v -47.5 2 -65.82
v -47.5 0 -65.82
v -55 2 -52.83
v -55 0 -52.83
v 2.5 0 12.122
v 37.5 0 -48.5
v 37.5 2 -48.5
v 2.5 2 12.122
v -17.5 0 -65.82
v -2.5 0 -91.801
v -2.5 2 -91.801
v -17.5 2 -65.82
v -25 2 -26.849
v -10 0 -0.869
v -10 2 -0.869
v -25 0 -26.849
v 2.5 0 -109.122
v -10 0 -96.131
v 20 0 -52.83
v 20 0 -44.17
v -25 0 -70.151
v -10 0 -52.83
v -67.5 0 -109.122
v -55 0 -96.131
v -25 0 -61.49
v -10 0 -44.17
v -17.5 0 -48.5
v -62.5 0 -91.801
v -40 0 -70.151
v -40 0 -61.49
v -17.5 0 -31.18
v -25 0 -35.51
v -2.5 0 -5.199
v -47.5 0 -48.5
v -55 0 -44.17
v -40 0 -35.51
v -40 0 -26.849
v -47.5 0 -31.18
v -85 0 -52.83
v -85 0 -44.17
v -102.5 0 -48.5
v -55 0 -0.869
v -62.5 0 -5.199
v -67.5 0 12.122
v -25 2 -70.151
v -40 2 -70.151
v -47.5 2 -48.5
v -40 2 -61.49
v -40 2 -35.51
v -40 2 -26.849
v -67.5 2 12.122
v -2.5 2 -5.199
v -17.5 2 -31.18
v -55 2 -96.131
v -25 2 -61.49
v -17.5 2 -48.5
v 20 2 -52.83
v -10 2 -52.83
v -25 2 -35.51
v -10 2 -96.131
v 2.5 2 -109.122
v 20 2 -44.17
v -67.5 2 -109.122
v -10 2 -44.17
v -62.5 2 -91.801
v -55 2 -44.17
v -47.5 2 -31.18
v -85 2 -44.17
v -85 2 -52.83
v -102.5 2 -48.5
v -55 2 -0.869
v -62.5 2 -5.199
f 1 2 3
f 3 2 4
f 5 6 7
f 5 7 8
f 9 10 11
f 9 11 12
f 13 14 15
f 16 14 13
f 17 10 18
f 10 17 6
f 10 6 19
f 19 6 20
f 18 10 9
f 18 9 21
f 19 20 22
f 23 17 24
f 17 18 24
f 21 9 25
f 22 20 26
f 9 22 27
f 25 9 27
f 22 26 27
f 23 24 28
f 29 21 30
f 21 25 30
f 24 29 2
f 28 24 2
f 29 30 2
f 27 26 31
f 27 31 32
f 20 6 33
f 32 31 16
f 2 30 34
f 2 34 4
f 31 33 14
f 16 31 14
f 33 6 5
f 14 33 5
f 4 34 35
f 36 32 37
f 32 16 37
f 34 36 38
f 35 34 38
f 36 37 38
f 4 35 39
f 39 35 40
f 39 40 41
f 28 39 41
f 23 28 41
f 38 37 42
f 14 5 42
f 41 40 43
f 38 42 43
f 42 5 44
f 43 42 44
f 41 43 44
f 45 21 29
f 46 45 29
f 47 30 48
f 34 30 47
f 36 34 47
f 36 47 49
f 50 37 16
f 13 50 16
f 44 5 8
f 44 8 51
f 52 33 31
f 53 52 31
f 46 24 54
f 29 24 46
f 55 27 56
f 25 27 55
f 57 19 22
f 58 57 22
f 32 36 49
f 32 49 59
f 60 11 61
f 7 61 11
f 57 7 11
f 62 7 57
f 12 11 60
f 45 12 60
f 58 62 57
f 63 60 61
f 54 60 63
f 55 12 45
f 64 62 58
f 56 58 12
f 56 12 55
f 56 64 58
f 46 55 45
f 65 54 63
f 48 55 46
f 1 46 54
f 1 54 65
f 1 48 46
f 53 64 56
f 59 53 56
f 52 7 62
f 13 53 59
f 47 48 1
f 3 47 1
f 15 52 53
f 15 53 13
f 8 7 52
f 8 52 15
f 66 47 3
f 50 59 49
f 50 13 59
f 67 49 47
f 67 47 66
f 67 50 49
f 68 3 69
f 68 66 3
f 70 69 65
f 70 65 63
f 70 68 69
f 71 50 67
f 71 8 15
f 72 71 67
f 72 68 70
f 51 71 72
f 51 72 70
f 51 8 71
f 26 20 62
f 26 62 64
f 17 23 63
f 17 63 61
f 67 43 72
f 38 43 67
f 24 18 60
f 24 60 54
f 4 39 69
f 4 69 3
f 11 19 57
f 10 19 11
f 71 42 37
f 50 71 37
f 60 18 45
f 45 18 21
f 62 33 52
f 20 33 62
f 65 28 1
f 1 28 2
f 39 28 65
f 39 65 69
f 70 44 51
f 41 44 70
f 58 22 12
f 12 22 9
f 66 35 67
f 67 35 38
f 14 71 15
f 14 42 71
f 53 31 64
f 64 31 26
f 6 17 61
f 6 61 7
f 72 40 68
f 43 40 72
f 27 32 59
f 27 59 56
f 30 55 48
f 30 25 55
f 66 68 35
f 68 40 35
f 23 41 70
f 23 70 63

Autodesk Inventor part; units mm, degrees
ref_plane "YZ Plane" through (0, 0, 0) normal (1, 0, 0) x (0, 1, 0)
ref_plane "XZ Plane" through (0, 0, 0) normal (0, 1, 0) x (-1, 0, 0)
ref_plane "XY Plane" through (0, 0, 0) normal (0, 0, 1) x (1, 0, 0)
sketch "Sketch6" plane through (0, 0, 0) normal (0, 1, 0) x (-1, 0, 0)
  circle A0 centre (32.5, -48.5) radius 70
  line L0 (102.5, -48.5) -> (67.5, -109.1218)
  line L1 (67.5, -109.1218) -> (-2.5, -109.1218)
  line L2 (-2.5, -109.1218) -> (-37.5, -48.5)
  line L3 (-37.5, -48.5) -> (-2.5, 12.1218)
  line L4 (-2.5, 12.1218) -> (67.5, 12.1218)
  line L5 (67.5, 12.1218) -> (102.5, -48.5)
  line L6 (32.5, 12.1218) -> (47.5, 12.1218)
  line L7 (47.5, 12.1218) -> (47.5, 5.6218)
  line L8 (47.5, 5.6218) -> (17.5, 5.6218)
  line L9 (17.5, 5.6218) -> (17.5, 12.1218)
  line L10 (47.5, 5.6218) -> (56.6924, 5.6218) construction
  line L11 (17.5, 8.8718) -> (20, 8.8718)
  line L12 (47.5, 8.8718) -> (45, 8.8718)
  line L13 (45, 8.8718) -> (45, 10.1218)
  line L14 (45, 10.1218) -> (20, 10.1218)
  line L15 (20, 10.1218) -> (20, 7.6218)
  line L16 (20, 7.6218) -> (45, 7.6218)
  line L17 (45, 7.6218) -> (45, 10.1218)
  line L18 (47.5, 5.6218) -> (56.6924, 5.6218)
  line L19 (17.5, 5.6218) -> (11, 5.6218)
  line L20 (17.5, 12.1218) -> (11, 5.6218)
  line L21 (17.5, 12.1218) -> (26.6924, 12.1218) construction
  line L22 (47.5, 12.1218) -> (54, 5.6218)
  line L23 (85, -18.1891) -> (77.5, -5.1987)
  line L24 (77.5, -5.1987) -> (71.8708, -8.4487)
  line L25 (71.8708, -8.4487) -> (86.8708, -34.4295)
  line L26 (86.8708, -34.4295) -> (92.5, -31.1795)
  line L27 (71.8708, -8.4487) -> (67.2746, -0.4879) construction
  line L28 (89.6854, -32.8045) -> (88.4354, -30.6394)
  line L29 (74.6854, -6.8237) -> (75.9354, -8.9888)
  line L30 (75.9354, -8.9888) -> (77.0179, -8.3638)
  line L31 (77.0179, -8.3638) -> (89.5179, -30.0144)
  line L32 (89.5179, -30.0144) -> (87.3529, -31.2644)
  line L33 (87.3529, -31.2644) -> (74.8529, -9.6138)
  line L34 (74.8529, -9.6138) -> (77.0179, -8.3638)
  line L35 (71.8708, -8.4487) -> (67.2746, -0.4879)
  line L36 (86.8708, -34.4295) -> (90.1208, -40.0587)
  line L37 (92.5, -31.1795) -> (90.1208, -40.0587)
  line L38 (92.5, -31.1795) -> (87.9038, -23.2187) construction
  line L39 (77.5, -5.1987) -> (68.6208, -2.8196)
  line L40 (71.8708, -88.5513) -> (67.2746, -96.5121) construction
  line L41 (74.6854, -90.1763) -> (75.9354, -88.0112)
  line L42 (74.8529, -87.3862) -> (77.0179, -88.6362)
  line L43 (77.5, -91.8013) -> (71.8708, -88.5513)
  line L44 (77.5, -91.8013) -> (68.6208, -94.1804)
  line L45 (71.8708, -88.5513) -> (67.2746, -96.5121)
  line L46 (77.0179, -88.6362) -> (89.5179, -66.9856)
  line L47 (87.3529, -65.7356) -> (74.8529, -87.3862)
  line L48 (71.8708, -88.5513) -> (86.8708, -62.5705)
  line L49 (89.5179, -66.9856) -> (87.3529, -65.7356)
  line L50 (89.6854, -64.1955) -> (88.4354, -66.3606)
  line L51 (86.8708, -62.5705) -> (92.5, -65.8205)
  line L52 (86.8708, -62.5705) -> (90.1208, -56.9413)
  line L53 (92.5, -65.8205) -> (90.1208, -56.9413)
  line L54 (94.9944, -48.5) -> (63.7472, -102.6218)
  line L55 (63.7472, -102.6218) -> (1.2528, -102.6218)
  line L56 (1.2528, -102.6218) -> (-29.9944, -48.5)
  line L57 (-29.9944, -48.5) -> (1.2528, 5.6218)
  line L58 (1.2528, 5.6218) -> (63.7472, 5.6218)
  line L59 (63.7472, 5.6218) -> (94.9944, -48.5)
  line L60 (74.8529, -87.3862) -> (73.1208, -86.3862)
  line L61 (87.3529, -65.7356) -> (85.6208, -64.7356)
  line L62 (87.3529, -31.2644) -> (85.6208, -32.2644)
  line L63 (74.8529, -9.6138) -> (73.1208, -10.6138)
  line L64 (45, 7.6218) -> (45, 5.6218)
  line L65 (20, 7.6218) -> (20, 5.6218)
  line L66 (-29.9944, -48.5) -> (-22.9944, -48.5)
  line L67 (-29.9944, -48.5) -> (-28.2944, -48.5)
  line L68 (-28.2944, -48.5) -> (-22.9944, -48.5)
  circle A1 centre (-26.9944, -48.5) radius 1.5
  line L69 (-29.9944, -48.5) -> (-23.9944, -48.5)
  line L70 (-23.9944, -48.5) -> (-26.9944, -53.6962)
  line L71 (-23.9944, -48.5) -> (-26.9944, -43.3038)
  point P0 (-27.5473, -52.7386)
  point P1 (-28.2775, -45.5261)
  point P2 (88.4354, -30.6394)
  point P3 (75.9354, -8.9888)
  point P4 (76.4767, -8.6763)
  point P5 (89.6854, -32.8045)
  point P6 (86.4869, -65.2356)
  point P7 (88.4354, -66.3606)
  dimension "d127" = 140
  dimension "d87" = 15
  dimension "d88" = 6.5
  dimension "d91" = 2.5
  dimension "d92" = 2.5
  dimension "d95" = 1.25
  dimension "d96" = 25
  dimension "d97" = 2.5
  dimension "d98" = 25
  dimension "d99" = 135
  dimension "d100" = 0
  dimension "d114" = 1.7
  dimension "d117" = 3
  dimension "d121" = 3
  dimension "d123" = 6
  dimension "d128" = 5.1962
  dimension "d129" = 5.1962
  dimension "d130" = 3
extrude "Fronte" add sketch "Sketch6" along normal blind 2 contours L0 L53 L54 L59 L37 L5 | L5 L39 L35 L59 L58 L18 L22 L4 | L1 L2 L3 L4 L20 L58 L57 L56 L55 L54 L45 L44 L0 | L0 L43 L41 L42 L46 L49 L50 L51 | L51 L52 L53 | L26 L28 L32 L31 L30 L29 L24 L5 | L37 L36 L26 | L7 L12 L13 L14 L15 L11 L9 L4 | L22 L18 L7 | L24 L35 L39 | L44 L45 L43 | L50 L49 L61 L48 L51 | L52 L48 L45 L54 L55 L56 L70 L71 L57 L58 L19 L8 L18 L59 L35 L25 L36 | L26 L25 L62 L32 L28 | L9 L19 L20 | L7 L8 L64 L17 L12 | L29 L34 L63 L25 L24 | L43 L48 L60 L42 L41 | L49 L46 L42 L47 | L32 L33 L34 L30 L31 | L11 L15 L65 L8 L9 | L17 L16 L15 L14 L13 | L47 L60 L48 L61 | L25 L63 L33 L62 | L8 L65 L16 L64 | L71 L66 A1 L57 | L66 A1 L70 L56 | A1 L66 | L66 A1
sketch "Sketch11" plane through (0, 0, 0) normal (0, -1, 0) x (1, 0, 0)
  line L0 (-63.7472, 5.6218) -> (-1.2528, -102.6218)
  line L1 (-94.9944, -48.5) -> (29.9944, -48.5)
  line L2 (-63.7472, -102.6218) -> (-1.2528, 5.6218)
  line L3 (-1.2528, 5.6218) -> (-1.2528, -102.6218)
  circle A0 centre (-32.5, -48.5) radius 55
  line L4 (-5, -0.8686) -> (22.5, -48.5)
  line L5 (22.5, -48.5) -> (-5, -96.1314)
  line L6 (-5, -96.1314) -> (-60, -96.1314)
  line L7 (-60, -96.1314) -> (-87.5, -48.5)
  line L8 (-87.5, -48.5) -> (-60, -0.8686)
  line L9 (-60, -0.8686) -> (-5, -0.8686)
  circle A1 centre (-32.5, -48.5) radius 25
  circle A2 centre (-32.5, -48.5) radius 15
  line L10 (-25, -35.5096) -> (-17.5, -48.5)
  line L11 (-17.5, -48.5) -> (-25, -61.4904)
  line L12 (-25, -61.4904) -> (-40, -61.4904)
  line L13 (-40, -61.4904) -> (-47.5, -48.5)
  line L14 (-47.5, -48.5) -> (-40, -35.5096)
  line L15 (-40, -35.5096) -> (-25, -35.5096)
  line L16 (-20, -26.8494) -> (-7.5, -48.5)
  line L17 (-7.5, -48.5) -> (-20, -70.1506)
  line L18 (-20, -70.1506) -> (-45, -70.1506)
  line L19 (-45, -70.1506) -> (-57.5, -48.5)
  line L20 (-57.5, -48.5) -> (-45, -26.8494)
  line L21 (-45, -26.8494) -> (-20, -26.8494)
  line L22 (-85, -44.1699) -> (-55, -44.1699)
  line L23 (-85, -52.8301) -> (-55, -52.8301)
  line L24 (-55, -96.1314) -> (-40, -70.1506)
  line L25 (-62.5, -91.8013) -> (-47.5, -65.8205)
  line L26 (-2.5, -91.8013) -> (-17.5, -65.8205)
  line L27 (-10, -96.1314) -> (-25, -70.1506)
  line L28 (20, -44.1699) -> (-10, -44.1699)
  line L29 (20, -52.8301) -> (-10, -52.8301)
  line L30 (-10, -0.8686) -> (-25, -26.8494)
  line L31 (-2.5, -5.1987) -> (-17.5, -31.1795)
  line L32 (-62.5, -5.1987) -> (-47.5, -31.1795)
  line L33 (-55, -0.8686) -> (-40, -26.8494)
  line L34 (-43.75, -42.0048) -> (-51.25, -37.6747)
  line L35 (-70, -52.8301) -> (-70, -44.1699)
  line L36 (2.2476, -108.6846) -> (-67.2476, -108.6846)
  line L37 (-67.2476, -108.6846) -> (-101.9952, -48.5)
  line L38 (-101.9952, -48.5) -> (-67.2476, 11.6846)
  line L39 (-67.2476, 11.6846) -> (2.2476, 11.6846)
  line L40 (2.2476, 11.6846) -> (36.9952, -48.5)
  line L41 (36.9952, -48.5) -> (2.2476, -108.6846)
  point P0 (0, 0)
  point P1 (-62.5, -91.8013)
  point P2 (-47.5, -65.8205)
  point P3 (-10, -96.1314)
  point P4 (-25, -70.1506)
  point P5 (-55, -96.1314)
  point P6 (-10, -52.8301)
  point P7 (-2.5, -91.8013)
  point P8 (20, -52.8301)
  point P9 (20, -44.1699)
  point P10 (-2.5, -5.1987)
  point P11 (-17.5, -31.1795)
  point P12 (-10, -44.1699)
  point P13 (-62.5, -5.1987)
  point P14 (-47.5, -31.1795)
  point P15 (-55, -0.8686)
  point P16 (-40, -26.8494)
  point P17 (-25, -26.8494)
  point P18 (-10, -0.8686)
  dimension "d158" = 110
  dimension "d159" = 50
  dimension "d160" = 30
  dimension "d164" = 360
extrude "Extrusion17" cut sketch "Sketch11" against normal blind 2 contours L32 A1 L22 L8 | L9 L30 A1 L33 | L15 L2 L0 | L0 L1 L14 | A1 L30 L21 L33 | L32 L20 L22 A1 | L4 L3 L28 A1 L31 | L23 A1 L25 L7 | L1 L11 L0 | L2 L13 L1 | L2 L10 L1 | L0 L12 L2 | A1 L28 L16 L31 | L4 L28 L3 | L24 A1 L27 L6 | L5 L3 L29 | L23 L19 L25 A1 | L24 L18 L27 A1 | L26 A1 L29 L3 L5 | L26 L17 L29 A1
properties part number "LightFrontalino" material "Wood (Oak)"
